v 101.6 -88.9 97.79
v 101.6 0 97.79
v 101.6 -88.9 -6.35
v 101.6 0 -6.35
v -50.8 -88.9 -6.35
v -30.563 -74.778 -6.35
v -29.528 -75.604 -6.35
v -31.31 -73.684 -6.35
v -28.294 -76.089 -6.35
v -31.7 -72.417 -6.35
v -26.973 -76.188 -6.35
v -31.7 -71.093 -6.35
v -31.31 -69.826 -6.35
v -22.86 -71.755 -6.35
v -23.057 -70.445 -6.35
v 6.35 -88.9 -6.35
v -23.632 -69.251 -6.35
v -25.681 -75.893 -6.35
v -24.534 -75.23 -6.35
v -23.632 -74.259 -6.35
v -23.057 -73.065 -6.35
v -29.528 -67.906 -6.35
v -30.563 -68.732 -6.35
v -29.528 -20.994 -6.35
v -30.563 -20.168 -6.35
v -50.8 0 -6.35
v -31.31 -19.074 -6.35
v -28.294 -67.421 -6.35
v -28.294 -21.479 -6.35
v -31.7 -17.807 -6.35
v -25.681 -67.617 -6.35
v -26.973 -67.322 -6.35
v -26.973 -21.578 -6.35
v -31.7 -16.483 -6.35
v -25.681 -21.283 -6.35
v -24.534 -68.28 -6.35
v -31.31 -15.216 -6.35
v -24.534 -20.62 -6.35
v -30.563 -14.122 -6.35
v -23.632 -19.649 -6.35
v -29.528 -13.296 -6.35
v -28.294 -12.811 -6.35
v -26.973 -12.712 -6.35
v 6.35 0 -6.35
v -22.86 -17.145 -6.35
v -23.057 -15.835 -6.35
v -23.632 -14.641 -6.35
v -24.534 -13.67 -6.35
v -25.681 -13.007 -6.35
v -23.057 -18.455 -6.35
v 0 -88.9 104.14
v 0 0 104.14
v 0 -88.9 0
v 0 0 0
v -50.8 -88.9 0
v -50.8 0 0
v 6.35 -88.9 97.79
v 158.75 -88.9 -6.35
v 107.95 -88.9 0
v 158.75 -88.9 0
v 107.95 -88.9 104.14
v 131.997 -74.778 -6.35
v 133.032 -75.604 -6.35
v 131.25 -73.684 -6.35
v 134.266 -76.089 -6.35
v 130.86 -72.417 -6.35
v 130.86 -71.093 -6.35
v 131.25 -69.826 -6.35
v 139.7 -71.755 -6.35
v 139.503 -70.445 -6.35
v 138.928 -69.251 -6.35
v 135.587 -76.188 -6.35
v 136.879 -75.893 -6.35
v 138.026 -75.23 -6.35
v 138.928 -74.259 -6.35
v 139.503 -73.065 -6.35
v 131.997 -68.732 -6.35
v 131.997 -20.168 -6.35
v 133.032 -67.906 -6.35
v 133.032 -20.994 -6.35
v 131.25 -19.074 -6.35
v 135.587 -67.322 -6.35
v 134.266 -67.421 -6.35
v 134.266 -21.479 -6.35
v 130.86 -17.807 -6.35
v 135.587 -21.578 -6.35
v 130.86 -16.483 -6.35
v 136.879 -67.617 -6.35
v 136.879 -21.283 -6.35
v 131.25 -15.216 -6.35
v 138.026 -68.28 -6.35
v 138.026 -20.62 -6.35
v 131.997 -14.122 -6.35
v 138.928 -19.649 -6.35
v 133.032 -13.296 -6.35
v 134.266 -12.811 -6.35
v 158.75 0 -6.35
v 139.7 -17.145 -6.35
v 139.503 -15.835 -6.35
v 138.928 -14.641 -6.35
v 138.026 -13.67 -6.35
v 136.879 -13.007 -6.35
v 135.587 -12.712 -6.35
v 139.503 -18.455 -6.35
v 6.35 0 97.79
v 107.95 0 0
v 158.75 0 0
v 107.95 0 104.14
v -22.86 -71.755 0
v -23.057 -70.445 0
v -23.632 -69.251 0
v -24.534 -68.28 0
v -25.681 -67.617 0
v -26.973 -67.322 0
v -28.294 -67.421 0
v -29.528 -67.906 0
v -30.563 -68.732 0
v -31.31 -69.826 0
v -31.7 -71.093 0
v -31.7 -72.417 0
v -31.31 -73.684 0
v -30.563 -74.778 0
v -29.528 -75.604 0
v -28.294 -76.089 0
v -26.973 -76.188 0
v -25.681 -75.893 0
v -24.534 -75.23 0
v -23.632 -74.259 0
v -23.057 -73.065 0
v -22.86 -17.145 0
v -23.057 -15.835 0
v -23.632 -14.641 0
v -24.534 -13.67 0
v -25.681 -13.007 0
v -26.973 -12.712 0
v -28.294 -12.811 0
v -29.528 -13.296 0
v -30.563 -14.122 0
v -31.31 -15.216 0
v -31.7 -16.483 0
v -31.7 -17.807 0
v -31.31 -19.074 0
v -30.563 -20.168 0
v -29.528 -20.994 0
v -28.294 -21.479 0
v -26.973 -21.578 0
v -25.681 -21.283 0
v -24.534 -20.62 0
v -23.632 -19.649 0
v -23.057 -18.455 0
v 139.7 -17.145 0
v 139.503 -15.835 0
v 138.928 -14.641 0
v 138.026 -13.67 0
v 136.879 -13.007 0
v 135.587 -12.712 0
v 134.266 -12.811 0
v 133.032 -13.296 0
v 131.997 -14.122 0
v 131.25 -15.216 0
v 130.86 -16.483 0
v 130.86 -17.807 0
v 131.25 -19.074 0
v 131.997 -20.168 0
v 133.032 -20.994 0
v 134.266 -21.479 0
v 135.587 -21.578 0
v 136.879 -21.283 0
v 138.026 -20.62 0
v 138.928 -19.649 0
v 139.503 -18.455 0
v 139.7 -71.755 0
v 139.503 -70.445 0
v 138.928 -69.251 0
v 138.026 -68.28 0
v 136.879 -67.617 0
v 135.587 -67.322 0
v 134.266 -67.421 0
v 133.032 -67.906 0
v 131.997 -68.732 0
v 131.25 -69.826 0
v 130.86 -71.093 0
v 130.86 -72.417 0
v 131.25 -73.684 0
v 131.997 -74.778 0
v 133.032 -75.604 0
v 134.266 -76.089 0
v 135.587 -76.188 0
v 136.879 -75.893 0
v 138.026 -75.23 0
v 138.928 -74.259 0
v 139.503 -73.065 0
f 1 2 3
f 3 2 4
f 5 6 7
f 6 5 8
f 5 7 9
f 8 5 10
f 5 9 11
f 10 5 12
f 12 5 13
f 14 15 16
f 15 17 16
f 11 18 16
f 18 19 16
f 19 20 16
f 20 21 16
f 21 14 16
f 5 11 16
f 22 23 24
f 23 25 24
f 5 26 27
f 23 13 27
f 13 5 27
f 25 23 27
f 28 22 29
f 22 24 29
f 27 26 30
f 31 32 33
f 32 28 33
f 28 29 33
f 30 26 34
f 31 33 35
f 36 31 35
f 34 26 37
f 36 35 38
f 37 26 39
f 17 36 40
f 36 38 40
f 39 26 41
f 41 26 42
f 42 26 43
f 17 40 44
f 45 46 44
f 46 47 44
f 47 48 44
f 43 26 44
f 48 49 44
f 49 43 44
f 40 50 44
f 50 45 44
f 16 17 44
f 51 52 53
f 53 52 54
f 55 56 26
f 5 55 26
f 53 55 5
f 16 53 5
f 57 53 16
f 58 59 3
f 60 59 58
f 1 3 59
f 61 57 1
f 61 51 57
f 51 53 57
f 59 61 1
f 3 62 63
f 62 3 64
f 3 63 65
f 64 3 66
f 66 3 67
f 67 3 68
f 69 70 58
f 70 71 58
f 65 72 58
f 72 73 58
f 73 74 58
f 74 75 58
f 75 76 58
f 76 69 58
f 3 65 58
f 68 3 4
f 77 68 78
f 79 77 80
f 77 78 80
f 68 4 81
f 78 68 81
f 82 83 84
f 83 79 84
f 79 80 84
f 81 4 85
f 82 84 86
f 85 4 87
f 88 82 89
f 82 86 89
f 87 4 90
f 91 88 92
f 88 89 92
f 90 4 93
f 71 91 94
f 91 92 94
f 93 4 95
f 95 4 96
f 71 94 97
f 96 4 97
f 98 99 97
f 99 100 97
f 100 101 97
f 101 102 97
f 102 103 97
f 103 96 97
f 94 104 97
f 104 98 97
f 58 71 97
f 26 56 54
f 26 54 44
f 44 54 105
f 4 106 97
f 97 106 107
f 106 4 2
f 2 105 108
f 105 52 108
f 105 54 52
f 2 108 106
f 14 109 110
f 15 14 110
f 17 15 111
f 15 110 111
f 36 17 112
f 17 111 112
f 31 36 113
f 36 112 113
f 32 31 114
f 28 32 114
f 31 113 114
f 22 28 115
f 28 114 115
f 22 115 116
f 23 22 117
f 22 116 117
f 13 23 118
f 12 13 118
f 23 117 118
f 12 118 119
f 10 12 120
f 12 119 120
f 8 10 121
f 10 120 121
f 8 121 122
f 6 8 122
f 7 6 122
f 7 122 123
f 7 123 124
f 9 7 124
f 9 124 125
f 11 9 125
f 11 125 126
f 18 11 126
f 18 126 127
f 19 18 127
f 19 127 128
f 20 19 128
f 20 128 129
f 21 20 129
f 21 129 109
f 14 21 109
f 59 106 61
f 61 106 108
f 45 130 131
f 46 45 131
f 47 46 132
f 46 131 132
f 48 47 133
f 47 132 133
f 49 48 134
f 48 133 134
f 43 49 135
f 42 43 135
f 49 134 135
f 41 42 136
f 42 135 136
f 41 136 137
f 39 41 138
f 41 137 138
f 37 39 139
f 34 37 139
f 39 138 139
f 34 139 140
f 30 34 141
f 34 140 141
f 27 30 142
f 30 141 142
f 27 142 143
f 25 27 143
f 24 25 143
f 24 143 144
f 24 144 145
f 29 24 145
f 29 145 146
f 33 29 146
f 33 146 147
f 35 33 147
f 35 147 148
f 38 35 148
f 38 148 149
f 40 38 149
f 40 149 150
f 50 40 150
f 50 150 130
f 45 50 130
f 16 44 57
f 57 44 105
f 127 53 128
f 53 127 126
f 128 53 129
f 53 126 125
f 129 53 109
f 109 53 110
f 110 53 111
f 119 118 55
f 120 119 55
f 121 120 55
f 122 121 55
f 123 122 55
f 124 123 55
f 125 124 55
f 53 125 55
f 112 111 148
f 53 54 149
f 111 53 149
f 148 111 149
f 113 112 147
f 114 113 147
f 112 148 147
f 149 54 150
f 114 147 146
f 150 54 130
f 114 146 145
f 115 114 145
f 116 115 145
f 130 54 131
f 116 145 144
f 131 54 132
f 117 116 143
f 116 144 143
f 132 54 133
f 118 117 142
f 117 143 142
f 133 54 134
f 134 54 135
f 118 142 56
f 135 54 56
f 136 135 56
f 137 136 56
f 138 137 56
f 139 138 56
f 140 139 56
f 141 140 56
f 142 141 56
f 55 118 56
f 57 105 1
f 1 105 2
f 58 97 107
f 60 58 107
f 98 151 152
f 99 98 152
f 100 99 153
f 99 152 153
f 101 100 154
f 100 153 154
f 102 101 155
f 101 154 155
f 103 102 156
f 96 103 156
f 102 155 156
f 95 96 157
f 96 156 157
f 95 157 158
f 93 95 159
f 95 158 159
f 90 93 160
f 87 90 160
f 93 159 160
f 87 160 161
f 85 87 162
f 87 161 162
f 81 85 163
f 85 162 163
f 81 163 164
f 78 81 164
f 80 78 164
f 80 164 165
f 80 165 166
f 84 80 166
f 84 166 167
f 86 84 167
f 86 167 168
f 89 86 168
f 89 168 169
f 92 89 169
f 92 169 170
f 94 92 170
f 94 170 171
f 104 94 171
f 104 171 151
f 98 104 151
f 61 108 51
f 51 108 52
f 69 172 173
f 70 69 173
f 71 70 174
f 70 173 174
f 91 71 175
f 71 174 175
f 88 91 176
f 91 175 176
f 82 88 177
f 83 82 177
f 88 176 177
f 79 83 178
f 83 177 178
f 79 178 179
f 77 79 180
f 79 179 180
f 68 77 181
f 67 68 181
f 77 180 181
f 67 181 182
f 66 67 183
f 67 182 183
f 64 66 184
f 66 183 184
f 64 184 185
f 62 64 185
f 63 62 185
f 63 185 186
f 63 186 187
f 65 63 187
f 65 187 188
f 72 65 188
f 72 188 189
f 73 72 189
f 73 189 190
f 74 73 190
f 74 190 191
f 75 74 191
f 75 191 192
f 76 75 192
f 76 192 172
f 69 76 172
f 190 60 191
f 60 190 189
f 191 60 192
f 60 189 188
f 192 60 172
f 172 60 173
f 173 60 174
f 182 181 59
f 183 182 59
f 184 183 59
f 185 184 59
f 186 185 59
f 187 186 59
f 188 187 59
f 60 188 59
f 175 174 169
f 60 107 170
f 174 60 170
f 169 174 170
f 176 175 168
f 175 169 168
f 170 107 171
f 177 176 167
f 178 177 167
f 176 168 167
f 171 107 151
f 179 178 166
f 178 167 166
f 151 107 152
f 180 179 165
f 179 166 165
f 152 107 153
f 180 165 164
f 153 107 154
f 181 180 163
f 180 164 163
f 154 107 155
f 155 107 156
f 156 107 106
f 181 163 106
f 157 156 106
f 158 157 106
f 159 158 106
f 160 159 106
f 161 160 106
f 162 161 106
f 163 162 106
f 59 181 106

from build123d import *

# Parameters (mm, degrees)
F1_DEPTH = 88.9
F2_R     = 4.445
F3_DEPTH = 6.351


with BuildPart() as f1:
    # F0 (on Front) → F1 (new body)
    with BuildSketch(Plane.XZ):
        Polygon((0, 104.14), (0, 0), (-50.8, 0), (-50.8, -6.35), (6.35, -6.35), (6.35, 0), (6.35, 97.79), (101.6, 97.79), (101.6, 0), (101.6, -6.35), (158.75, -6.35), (158.75, 0), (107.95, 0), (107.95, 75.717971), (107.95, 104.14), align=None)
    extrude(amount=F1_DEPTH)

    # F2 (on face) → F3 (cut, through all)
    with BuildSketch(Plane.XY):
        with Locations((-27.305, -17.145)):
            Circle(F2_R)
        with Locations((-27.305, -71.755)):
            Circle(F2_R)
        with Locations((135.255, -71.755)):
            Circle(F2_R)
        with Locations((135.255, -17.145)):
            Circle(F2_R)
    extrude(amount=-F3_DEPTH, mode=Mode.SUBTRACT)


solid = f1.part
